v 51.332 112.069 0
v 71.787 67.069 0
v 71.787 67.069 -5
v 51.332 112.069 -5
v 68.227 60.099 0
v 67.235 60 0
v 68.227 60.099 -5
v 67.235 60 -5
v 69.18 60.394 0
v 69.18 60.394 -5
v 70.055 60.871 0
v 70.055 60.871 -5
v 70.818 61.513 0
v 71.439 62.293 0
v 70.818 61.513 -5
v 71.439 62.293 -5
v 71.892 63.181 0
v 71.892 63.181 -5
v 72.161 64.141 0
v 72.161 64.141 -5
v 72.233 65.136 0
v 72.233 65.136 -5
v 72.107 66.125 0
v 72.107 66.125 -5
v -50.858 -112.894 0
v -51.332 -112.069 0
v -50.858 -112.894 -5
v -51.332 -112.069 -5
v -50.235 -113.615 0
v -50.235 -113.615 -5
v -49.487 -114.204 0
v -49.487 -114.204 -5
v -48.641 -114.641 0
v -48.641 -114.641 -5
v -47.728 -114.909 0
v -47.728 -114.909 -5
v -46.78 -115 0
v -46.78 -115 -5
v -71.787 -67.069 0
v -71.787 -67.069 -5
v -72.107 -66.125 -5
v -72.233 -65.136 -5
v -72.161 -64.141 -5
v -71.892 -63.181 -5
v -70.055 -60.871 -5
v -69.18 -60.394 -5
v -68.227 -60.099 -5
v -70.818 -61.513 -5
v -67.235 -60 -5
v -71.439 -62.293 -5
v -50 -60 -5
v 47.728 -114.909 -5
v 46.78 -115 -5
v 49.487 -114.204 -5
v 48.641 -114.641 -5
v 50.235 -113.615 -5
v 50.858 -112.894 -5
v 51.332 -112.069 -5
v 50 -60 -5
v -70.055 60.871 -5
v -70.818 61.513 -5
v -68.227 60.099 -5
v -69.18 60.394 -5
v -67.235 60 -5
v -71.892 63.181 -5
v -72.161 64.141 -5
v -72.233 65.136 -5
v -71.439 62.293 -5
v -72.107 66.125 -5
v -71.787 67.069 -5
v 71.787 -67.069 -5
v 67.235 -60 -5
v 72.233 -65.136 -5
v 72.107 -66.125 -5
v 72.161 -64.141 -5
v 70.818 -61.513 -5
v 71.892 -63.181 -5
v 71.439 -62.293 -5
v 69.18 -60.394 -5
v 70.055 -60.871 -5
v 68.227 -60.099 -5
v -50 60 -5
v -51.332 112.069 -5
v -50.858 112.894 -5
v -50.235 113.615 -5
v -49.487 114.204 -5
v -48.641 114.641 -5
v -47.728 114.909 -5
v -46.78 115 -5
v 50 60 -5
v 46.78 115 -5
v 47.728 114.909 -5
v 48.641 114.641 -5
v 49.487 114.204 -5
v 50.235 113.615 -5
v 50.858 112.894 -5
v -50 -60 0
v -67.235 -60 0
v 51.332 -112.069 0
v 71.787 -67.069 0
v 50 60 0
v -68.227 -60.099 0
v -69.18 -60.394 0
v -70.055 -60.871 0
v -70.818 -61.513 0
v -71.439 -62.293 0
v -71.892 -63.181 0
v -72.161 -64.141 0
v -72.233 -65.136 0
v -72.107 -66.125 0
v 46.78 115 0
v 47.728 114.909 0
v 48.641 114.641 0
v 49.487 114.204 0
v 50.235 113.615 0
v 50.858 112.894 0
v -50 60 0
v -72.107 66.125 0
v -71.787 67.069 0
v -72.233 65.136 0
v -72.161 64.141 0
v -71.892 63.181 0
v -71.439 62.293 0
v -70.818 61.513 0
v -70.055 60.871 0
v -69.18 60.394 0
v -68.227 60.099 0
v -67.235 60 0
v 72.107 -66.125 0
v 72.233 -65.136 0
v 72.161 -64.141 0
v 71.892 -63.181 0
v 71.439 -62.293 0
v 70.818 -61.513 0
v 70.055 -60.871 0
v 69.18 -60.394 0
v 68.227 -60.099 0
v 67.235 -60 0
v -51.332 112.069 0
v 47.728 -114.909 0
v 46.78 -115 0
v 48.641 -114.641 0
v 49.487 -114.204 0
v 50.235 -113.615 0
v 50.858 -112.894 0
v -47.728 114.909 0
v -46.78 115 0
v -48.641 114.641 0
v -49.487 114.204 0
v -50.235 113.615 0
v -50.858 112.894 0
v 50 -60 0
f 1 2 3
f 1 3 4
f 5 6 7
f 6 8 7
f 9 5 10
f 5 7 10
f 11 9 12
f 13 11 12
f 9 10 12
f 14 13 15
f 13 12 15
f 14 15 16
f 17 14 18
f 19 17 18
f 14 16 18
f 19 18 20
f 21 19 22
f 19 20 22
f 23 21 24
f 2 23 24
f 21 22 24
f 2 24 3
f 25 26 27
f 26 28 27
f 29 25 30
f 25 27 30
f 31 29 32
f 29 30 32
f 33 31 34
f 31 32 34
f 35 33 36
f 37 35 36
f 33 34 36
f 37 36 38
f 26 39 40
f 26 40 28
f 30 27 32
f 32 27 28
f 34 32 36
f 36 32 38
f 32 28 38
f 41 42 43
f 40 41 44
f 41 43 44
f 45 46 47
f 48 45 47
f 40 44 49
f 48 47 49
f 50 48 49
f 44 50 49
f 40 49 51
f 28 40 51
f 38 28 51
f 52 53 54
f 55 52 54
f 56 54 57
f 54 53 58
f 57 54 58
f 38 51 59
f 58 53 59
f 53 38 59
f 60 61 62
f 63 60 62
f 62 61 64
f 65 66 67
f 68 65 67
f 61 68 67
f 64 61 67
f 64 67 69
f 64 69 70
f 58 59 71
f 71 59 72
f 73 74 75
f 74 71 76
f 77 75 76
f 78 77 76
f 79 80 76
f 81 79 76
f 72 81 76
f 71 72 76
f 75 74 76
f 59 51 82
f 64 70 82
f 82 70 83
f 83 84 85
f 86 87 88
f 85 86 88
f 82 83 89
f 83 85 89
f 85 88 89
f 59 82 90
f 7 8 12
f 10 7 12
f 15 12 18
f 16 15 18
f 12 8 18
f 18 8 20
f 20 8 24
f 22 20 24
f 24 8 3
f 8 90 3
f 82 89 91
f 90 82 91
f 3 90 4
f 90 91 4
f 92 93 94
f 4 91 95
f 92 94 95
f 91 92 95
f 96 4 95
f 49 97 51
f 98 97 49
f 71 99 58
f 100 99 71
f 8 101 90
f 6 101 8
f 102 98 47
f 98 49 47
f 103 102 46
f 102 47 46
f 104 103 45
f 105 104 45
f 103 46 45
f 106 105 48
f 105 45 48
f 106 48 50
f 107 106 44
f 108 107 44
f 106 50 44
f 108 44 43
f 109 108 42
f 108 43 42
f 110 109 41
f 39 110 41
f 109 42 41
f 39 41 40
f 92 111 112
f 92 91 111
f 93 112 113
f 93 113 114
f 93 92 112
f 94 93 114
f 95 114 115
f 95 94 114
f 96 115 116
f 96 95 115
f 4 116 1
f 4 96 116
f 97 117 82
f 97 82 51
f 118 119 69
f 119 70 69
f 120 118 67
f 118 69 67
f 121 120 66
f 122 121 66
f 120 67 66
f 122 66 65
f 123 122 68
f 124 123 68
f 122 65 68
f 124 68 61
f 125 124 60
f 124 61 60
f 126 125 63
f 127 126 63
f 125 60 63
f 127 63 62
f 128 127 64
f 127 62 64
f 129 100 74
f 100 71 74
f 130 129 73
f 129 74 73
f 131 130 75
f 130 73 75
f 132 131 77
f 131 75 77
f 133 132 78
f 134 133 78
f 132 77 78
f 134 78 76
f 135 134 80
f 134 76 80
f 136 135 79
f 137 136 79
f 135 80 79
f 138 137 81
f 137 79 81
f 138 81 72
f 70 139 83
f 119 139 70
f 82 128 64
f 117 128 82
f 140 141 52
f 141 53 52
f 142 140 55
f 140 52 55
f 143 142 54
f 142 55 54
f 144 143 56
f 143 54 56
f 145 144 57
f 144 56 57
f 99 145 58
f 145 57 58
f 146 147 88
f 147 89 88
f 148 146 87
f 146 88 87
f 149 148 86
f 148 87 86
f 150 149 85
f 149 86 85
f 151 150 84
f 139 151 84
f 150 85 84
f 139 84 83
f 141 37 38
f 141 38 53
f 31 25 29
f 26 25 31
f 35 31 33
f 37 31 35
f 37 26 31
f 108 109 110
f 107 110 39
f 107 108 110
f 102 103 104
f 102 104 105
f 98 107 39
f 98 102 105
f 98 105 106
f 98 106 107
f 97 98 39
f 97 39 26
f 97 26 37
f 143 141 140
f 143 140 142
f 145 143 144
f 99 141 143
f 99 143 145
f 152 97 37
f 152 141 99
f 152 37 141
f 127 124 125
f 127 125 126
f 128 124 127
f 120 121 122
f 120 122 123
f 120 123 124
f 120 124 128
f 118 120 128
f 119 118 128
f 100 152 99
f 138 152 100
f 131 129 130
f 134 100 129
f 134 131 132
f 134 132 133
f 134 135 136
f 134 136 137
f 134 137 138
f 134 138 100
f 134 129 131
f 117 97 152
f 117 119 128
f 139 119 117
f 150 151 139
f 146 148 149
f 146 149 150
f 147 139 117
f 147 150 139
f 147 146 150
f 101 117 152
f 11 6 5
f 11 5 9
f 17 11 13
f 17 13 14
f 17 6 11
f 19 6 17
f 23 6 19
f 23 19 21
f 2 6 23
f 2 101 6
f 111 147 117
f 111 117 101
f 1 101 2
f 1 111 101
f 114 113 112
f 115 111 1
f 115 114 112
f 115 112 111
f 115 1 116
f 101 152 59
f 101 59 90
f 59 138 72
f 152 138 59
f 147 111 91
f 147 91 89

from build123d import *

# Parameters (mm, degrees)
BOSS_EXTRUDE1_DEPTH = 5
FILLET2_R           = 5


with BuildPart() as part:
    # Sketch3 → Boss-Extrude1 (new body)
    with BuildSketch(Plane.XY):
        Polygon((50, 115), (-50, 115), (-75, 60), (-50, 60), (-50, -60), (-75, -60), (-50, -115), (50, -115), (75, -60), (50, -60), (50, 60), (75, 60), align=None)
    extrude(amount=-BOSS_EXTRUDE1_DEPTH)

    # Fillet2
    fillet2_edges = [part.edges().sort_by_distance(p)[0] for p in [
        (-50, 115, -2.5),
        (50, 115, -2.5),
        (75, 60, -2.5),
        (75, -60, -2.5),
        (50, -115, -2.5),
        (-50, -115, -2.5),
        (-75, -60, -2.5),
        (-75, 60, -2.5),
    ]]
    fillet(fillet2_edges, radius=FILLET2_R)


solid = part.part
